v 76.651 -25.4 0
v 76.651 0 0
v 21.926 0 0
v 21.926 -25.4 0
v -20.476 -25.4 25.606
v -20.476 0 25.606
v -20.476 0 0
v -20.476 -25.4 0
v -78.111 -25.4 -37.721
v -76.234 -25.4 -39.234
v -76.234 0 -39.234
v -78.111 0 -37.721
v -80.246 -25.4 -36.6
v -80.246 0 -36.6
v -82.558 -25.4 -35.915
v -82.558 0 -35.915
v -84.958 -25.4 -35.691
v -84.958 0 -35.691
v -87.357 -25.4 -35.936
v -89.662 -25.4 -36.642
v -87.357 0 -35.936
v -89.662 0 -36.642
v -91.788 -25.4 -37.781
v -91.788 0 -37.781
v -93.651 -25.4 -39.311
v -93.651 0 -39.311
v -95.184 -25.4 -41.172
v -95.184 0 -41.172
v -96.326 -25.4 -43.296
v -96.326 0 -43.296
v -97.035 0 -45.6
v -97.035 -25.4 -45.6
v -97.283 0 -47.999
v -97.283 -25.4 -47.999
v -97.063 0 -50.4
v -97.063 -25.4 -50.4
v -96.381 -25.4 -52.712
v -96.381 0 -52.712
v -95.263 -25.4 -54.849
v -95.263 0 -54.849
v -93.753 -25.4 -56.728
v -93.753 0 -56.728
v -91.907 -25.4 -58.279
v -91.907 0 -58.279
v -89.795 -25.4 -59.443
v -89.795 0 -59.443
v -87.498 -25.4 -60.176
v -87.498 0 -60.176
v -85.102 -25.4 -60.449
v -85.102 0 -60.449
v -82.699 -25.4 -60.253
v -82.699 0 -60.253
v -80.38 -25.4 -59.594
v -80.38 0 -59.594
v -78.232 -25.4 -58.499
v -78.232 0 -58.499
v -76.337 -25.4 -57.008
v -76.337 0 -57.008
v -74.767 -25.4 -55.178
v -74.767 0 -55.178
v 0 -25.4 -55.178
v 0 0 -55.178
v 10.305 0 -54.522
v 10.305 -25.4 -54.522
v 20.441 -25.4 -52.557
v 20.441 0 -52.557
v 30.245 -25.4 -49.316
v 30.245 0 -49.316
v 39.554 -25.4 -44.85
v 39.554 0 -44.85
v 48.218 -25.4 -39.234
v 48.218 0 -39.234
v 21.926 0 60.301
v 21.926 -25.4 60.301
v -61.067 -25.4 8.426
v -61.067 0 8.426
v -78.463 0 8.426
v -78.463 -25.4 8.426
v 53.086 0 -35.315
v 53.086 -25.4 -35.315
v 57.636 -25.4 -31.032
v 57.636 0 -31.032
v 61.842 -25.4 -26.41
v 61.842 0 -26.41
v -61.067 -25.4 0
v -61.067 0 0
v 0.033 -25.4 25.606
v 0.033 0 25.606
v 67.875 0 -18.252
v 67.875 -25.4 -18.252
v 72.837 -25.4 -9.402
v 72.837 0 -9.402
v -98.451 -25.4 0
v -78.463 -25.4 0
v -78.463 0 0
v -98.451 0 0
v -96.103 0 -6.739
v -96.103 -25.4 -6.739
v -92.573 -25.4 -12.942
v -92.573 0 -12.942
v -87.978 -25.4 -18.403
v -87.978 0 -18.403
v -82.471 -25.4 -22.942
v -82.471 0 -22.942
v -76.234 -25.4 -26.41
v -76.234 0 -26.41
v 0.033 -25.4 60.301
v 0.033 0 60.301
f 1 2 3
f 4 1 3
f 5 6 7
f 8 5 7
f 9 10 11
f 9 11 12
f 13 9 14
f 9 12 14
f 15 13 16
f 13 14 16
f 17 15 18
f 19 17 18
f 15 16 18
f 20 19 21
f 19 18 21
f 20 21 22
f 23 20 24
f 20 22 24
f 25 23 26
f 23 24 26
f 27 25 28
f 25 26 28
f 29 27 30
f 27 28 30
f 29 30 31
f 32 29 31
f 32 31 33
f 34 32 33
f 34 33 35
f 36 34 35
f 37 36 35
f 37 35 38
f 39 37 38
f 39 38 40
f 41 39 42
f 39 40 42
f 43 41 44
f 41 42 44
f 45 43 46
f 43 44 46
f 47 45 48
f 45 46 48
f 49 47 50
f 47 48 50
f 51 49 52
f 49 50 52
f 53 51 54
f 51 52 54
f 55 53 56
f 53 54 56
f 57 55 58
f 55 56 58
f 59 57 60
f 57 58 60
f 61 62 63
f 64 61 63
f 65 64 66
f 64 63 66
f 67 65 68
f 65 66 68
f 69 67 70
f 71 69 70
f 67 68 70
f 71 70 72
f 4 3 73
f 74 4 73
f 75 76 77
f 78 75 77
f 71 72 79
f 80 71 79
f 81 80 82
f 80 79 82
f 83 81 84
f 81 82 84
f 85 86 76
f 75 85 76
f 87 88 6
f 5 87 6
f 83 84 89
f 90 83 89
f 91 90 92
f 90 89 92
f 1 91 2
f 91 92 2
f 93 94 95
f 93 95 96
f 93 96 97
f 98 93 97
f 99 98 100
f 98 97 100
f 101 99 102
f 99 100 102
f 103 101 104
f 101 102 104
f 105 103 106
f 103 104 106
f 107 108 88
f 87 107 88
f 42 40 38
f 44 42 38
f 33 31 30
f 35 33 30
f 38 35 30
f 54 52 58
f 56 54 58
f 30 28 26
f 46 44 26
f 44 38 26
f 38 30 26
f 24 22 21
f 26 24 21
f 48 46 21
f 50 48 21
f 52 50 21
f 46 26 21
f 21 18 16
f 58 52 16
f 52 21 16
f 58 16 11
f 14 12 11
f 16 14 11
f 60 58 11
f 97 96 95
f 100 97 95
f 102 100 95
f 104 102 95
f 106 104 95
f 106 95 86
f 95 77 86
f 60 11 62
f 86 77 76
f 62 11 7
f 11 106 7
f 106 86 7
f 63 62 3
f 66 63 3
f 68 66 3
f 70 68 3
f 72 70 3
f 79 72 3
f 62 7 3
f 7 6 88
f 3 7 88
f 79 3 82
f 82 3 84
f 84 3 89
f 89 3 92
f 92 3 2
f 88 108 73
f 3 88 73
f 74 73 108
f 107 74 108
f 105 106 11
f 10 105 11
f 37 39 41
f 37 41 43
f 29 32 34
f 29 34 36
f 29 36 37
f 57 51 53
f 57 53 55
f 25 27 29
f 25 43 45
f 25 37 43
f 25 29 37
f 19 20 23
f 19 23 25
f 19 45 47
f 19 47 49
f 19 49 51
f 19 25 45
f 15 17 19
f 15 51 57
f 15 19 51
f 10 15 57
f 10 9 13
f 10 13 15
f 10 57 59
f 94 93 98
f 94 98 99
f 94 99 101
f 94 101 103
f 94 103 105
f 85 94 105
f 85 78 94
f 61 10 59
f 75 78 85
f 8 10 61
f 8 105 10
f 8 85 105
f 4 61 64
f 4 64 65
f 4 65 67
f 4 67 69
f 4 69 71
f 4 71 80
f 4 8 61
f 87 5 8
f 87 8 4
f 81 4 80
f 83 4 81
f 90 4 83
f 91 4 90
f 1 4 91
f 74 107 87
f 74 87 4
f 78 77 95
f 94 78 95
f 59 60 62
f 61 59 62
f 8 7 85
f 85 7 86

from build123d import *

# Parameters (mm, degrees)
F0_W     = 76.2336051654
F0_H     = 12.8238399291
F1_DEPTH = 25.4


with BuildPart() as f1:
    # F0 (on Front) → F1 (new body)
    with BuildSketch(Plane.XZ):
        with BuildLine():
            Line((0, -39.2335951328), (0, -55.1777966321))
            ThreePointArc((0, -55.1777966321), (25.3947344291, -51.0934089949), (48.2183970243, -39.2335951328))
            Line((48.2183970243, -39.2335951328), (0, -39.2335951328))
        make_face()
        Polygon((-74.7671502275, -55.1777966321), (0, -55.1777966321), (0, -39.2335951328), (-76.2336051654, -39.2335951328), (-76.2336051654, -55.1777966321), align=None)
        with BuildLine():
            Line((0, -39.2335951328), (48.2183970243, -39.2335951328))
            ThreePointArc((48.2183970243, -39.2335951328), (55.4027211148, -33.2174165852), (61.8420272475, -26.4097552037))
            Line((61.8420272475, -26.4097552037), (0, -26.4097552037))
            Line((0, -26.4097552037), (0, -39.2335951328))
        make_face()
        with BuildLine():
            ThreePointArc((-76.2336051654, -39.2335951328), (-97.2315440125, -49.2044021928), (-74.7671502275, -55.1777966321))
            Line((-74.7671502275, -55.1777966321), (-76.2336051654, -55.1777966321))
            Line((-76.2336051654, -55.1777966321), (-76.2336051654, -39.2335951328))
        make_face()
        with Locations((-38.1168025827, -32.8216751683)):
            Rectangle(F0_W, F0_H)
        with BuildLine():
            Line((61.8420272475, -13.3770994993), (61.8420272475, -26.4097552037))
            ThreePointArc((61.8420272475, -26.4097552037), (70.4948614625, -13.9048920781), (76.6509249806, 0))
            Line((76.6509249806, 0), (61.8420272475, 0))
            Line((61.8420272475, 0), (61.8420272475, -13.3770994993))
        make_face()
        Polygon((0, -26.4097552037), (61.8420272475, -26.4097552037), (61.8420272475, -13.3770994993), (0.0163518326, -13.2999842622), align=None)
        Polygon((-76.2336051654, -26.4097552037), (0, -26.4097552037), (0.0163518326, -13.2999842622), (-76.2336051654, -13.2048776019), align=None)
        Polygon((0.0163518326, -13.2999842622), (61.8420272475, -13.3770994993), (61.8420272475, 0), (21.9261534512, 0), (0.0329409185, 0), align=None)
        with BuildLine():
            ThreePointArc((-98.4511649107, 0), (-90.3999949354, -15.7771328177), (-76.2336051654, -26.4097552037))
            Line((-76.2336051654, -26.4097552037), (-76.2336051654, -13.2048776019))
            Line((-76.2336051654, -13.2048776019), (-76.2336051654, 0))
            Line((-76.2336051654, 0), (-78.4630104899, 0))
            Line((-78.4630104899, 0), (-98.4511649107, 0))
        make_face()
        Polygon((-76.2336051654, -13.2048776019), (0.0163518326, -13.2999842622), (0.0329409185, 0), (0, 0), (-20.4764902592, 0), (-61.0670559108, 0), (-76.2336051654, 0), align=None)
        Polygon((0.0329409185, 25.6056360344), (0.0329409185, 0), (21.9261534512, 0), (21.9261534512, 60.3007838378), (0.0329409185, 60.3007838378), align=None)
        Polygon((0, 0), (0.0329409185, 0), (0.0329409185, 25.6056360344), (-20.4764902592, 25.6056360344), (-20.4764902592, 0), align=None)
        Polygon((-78.4630104899, 0), (-76.2336051654, 0), (-61.0670559108, 0), (-61.0670559108, 8.4261661395), (-78.4630104899, 8.4261661395), align=None)
    extrude(amount=F1_DEPTH)


solid = f1.part
